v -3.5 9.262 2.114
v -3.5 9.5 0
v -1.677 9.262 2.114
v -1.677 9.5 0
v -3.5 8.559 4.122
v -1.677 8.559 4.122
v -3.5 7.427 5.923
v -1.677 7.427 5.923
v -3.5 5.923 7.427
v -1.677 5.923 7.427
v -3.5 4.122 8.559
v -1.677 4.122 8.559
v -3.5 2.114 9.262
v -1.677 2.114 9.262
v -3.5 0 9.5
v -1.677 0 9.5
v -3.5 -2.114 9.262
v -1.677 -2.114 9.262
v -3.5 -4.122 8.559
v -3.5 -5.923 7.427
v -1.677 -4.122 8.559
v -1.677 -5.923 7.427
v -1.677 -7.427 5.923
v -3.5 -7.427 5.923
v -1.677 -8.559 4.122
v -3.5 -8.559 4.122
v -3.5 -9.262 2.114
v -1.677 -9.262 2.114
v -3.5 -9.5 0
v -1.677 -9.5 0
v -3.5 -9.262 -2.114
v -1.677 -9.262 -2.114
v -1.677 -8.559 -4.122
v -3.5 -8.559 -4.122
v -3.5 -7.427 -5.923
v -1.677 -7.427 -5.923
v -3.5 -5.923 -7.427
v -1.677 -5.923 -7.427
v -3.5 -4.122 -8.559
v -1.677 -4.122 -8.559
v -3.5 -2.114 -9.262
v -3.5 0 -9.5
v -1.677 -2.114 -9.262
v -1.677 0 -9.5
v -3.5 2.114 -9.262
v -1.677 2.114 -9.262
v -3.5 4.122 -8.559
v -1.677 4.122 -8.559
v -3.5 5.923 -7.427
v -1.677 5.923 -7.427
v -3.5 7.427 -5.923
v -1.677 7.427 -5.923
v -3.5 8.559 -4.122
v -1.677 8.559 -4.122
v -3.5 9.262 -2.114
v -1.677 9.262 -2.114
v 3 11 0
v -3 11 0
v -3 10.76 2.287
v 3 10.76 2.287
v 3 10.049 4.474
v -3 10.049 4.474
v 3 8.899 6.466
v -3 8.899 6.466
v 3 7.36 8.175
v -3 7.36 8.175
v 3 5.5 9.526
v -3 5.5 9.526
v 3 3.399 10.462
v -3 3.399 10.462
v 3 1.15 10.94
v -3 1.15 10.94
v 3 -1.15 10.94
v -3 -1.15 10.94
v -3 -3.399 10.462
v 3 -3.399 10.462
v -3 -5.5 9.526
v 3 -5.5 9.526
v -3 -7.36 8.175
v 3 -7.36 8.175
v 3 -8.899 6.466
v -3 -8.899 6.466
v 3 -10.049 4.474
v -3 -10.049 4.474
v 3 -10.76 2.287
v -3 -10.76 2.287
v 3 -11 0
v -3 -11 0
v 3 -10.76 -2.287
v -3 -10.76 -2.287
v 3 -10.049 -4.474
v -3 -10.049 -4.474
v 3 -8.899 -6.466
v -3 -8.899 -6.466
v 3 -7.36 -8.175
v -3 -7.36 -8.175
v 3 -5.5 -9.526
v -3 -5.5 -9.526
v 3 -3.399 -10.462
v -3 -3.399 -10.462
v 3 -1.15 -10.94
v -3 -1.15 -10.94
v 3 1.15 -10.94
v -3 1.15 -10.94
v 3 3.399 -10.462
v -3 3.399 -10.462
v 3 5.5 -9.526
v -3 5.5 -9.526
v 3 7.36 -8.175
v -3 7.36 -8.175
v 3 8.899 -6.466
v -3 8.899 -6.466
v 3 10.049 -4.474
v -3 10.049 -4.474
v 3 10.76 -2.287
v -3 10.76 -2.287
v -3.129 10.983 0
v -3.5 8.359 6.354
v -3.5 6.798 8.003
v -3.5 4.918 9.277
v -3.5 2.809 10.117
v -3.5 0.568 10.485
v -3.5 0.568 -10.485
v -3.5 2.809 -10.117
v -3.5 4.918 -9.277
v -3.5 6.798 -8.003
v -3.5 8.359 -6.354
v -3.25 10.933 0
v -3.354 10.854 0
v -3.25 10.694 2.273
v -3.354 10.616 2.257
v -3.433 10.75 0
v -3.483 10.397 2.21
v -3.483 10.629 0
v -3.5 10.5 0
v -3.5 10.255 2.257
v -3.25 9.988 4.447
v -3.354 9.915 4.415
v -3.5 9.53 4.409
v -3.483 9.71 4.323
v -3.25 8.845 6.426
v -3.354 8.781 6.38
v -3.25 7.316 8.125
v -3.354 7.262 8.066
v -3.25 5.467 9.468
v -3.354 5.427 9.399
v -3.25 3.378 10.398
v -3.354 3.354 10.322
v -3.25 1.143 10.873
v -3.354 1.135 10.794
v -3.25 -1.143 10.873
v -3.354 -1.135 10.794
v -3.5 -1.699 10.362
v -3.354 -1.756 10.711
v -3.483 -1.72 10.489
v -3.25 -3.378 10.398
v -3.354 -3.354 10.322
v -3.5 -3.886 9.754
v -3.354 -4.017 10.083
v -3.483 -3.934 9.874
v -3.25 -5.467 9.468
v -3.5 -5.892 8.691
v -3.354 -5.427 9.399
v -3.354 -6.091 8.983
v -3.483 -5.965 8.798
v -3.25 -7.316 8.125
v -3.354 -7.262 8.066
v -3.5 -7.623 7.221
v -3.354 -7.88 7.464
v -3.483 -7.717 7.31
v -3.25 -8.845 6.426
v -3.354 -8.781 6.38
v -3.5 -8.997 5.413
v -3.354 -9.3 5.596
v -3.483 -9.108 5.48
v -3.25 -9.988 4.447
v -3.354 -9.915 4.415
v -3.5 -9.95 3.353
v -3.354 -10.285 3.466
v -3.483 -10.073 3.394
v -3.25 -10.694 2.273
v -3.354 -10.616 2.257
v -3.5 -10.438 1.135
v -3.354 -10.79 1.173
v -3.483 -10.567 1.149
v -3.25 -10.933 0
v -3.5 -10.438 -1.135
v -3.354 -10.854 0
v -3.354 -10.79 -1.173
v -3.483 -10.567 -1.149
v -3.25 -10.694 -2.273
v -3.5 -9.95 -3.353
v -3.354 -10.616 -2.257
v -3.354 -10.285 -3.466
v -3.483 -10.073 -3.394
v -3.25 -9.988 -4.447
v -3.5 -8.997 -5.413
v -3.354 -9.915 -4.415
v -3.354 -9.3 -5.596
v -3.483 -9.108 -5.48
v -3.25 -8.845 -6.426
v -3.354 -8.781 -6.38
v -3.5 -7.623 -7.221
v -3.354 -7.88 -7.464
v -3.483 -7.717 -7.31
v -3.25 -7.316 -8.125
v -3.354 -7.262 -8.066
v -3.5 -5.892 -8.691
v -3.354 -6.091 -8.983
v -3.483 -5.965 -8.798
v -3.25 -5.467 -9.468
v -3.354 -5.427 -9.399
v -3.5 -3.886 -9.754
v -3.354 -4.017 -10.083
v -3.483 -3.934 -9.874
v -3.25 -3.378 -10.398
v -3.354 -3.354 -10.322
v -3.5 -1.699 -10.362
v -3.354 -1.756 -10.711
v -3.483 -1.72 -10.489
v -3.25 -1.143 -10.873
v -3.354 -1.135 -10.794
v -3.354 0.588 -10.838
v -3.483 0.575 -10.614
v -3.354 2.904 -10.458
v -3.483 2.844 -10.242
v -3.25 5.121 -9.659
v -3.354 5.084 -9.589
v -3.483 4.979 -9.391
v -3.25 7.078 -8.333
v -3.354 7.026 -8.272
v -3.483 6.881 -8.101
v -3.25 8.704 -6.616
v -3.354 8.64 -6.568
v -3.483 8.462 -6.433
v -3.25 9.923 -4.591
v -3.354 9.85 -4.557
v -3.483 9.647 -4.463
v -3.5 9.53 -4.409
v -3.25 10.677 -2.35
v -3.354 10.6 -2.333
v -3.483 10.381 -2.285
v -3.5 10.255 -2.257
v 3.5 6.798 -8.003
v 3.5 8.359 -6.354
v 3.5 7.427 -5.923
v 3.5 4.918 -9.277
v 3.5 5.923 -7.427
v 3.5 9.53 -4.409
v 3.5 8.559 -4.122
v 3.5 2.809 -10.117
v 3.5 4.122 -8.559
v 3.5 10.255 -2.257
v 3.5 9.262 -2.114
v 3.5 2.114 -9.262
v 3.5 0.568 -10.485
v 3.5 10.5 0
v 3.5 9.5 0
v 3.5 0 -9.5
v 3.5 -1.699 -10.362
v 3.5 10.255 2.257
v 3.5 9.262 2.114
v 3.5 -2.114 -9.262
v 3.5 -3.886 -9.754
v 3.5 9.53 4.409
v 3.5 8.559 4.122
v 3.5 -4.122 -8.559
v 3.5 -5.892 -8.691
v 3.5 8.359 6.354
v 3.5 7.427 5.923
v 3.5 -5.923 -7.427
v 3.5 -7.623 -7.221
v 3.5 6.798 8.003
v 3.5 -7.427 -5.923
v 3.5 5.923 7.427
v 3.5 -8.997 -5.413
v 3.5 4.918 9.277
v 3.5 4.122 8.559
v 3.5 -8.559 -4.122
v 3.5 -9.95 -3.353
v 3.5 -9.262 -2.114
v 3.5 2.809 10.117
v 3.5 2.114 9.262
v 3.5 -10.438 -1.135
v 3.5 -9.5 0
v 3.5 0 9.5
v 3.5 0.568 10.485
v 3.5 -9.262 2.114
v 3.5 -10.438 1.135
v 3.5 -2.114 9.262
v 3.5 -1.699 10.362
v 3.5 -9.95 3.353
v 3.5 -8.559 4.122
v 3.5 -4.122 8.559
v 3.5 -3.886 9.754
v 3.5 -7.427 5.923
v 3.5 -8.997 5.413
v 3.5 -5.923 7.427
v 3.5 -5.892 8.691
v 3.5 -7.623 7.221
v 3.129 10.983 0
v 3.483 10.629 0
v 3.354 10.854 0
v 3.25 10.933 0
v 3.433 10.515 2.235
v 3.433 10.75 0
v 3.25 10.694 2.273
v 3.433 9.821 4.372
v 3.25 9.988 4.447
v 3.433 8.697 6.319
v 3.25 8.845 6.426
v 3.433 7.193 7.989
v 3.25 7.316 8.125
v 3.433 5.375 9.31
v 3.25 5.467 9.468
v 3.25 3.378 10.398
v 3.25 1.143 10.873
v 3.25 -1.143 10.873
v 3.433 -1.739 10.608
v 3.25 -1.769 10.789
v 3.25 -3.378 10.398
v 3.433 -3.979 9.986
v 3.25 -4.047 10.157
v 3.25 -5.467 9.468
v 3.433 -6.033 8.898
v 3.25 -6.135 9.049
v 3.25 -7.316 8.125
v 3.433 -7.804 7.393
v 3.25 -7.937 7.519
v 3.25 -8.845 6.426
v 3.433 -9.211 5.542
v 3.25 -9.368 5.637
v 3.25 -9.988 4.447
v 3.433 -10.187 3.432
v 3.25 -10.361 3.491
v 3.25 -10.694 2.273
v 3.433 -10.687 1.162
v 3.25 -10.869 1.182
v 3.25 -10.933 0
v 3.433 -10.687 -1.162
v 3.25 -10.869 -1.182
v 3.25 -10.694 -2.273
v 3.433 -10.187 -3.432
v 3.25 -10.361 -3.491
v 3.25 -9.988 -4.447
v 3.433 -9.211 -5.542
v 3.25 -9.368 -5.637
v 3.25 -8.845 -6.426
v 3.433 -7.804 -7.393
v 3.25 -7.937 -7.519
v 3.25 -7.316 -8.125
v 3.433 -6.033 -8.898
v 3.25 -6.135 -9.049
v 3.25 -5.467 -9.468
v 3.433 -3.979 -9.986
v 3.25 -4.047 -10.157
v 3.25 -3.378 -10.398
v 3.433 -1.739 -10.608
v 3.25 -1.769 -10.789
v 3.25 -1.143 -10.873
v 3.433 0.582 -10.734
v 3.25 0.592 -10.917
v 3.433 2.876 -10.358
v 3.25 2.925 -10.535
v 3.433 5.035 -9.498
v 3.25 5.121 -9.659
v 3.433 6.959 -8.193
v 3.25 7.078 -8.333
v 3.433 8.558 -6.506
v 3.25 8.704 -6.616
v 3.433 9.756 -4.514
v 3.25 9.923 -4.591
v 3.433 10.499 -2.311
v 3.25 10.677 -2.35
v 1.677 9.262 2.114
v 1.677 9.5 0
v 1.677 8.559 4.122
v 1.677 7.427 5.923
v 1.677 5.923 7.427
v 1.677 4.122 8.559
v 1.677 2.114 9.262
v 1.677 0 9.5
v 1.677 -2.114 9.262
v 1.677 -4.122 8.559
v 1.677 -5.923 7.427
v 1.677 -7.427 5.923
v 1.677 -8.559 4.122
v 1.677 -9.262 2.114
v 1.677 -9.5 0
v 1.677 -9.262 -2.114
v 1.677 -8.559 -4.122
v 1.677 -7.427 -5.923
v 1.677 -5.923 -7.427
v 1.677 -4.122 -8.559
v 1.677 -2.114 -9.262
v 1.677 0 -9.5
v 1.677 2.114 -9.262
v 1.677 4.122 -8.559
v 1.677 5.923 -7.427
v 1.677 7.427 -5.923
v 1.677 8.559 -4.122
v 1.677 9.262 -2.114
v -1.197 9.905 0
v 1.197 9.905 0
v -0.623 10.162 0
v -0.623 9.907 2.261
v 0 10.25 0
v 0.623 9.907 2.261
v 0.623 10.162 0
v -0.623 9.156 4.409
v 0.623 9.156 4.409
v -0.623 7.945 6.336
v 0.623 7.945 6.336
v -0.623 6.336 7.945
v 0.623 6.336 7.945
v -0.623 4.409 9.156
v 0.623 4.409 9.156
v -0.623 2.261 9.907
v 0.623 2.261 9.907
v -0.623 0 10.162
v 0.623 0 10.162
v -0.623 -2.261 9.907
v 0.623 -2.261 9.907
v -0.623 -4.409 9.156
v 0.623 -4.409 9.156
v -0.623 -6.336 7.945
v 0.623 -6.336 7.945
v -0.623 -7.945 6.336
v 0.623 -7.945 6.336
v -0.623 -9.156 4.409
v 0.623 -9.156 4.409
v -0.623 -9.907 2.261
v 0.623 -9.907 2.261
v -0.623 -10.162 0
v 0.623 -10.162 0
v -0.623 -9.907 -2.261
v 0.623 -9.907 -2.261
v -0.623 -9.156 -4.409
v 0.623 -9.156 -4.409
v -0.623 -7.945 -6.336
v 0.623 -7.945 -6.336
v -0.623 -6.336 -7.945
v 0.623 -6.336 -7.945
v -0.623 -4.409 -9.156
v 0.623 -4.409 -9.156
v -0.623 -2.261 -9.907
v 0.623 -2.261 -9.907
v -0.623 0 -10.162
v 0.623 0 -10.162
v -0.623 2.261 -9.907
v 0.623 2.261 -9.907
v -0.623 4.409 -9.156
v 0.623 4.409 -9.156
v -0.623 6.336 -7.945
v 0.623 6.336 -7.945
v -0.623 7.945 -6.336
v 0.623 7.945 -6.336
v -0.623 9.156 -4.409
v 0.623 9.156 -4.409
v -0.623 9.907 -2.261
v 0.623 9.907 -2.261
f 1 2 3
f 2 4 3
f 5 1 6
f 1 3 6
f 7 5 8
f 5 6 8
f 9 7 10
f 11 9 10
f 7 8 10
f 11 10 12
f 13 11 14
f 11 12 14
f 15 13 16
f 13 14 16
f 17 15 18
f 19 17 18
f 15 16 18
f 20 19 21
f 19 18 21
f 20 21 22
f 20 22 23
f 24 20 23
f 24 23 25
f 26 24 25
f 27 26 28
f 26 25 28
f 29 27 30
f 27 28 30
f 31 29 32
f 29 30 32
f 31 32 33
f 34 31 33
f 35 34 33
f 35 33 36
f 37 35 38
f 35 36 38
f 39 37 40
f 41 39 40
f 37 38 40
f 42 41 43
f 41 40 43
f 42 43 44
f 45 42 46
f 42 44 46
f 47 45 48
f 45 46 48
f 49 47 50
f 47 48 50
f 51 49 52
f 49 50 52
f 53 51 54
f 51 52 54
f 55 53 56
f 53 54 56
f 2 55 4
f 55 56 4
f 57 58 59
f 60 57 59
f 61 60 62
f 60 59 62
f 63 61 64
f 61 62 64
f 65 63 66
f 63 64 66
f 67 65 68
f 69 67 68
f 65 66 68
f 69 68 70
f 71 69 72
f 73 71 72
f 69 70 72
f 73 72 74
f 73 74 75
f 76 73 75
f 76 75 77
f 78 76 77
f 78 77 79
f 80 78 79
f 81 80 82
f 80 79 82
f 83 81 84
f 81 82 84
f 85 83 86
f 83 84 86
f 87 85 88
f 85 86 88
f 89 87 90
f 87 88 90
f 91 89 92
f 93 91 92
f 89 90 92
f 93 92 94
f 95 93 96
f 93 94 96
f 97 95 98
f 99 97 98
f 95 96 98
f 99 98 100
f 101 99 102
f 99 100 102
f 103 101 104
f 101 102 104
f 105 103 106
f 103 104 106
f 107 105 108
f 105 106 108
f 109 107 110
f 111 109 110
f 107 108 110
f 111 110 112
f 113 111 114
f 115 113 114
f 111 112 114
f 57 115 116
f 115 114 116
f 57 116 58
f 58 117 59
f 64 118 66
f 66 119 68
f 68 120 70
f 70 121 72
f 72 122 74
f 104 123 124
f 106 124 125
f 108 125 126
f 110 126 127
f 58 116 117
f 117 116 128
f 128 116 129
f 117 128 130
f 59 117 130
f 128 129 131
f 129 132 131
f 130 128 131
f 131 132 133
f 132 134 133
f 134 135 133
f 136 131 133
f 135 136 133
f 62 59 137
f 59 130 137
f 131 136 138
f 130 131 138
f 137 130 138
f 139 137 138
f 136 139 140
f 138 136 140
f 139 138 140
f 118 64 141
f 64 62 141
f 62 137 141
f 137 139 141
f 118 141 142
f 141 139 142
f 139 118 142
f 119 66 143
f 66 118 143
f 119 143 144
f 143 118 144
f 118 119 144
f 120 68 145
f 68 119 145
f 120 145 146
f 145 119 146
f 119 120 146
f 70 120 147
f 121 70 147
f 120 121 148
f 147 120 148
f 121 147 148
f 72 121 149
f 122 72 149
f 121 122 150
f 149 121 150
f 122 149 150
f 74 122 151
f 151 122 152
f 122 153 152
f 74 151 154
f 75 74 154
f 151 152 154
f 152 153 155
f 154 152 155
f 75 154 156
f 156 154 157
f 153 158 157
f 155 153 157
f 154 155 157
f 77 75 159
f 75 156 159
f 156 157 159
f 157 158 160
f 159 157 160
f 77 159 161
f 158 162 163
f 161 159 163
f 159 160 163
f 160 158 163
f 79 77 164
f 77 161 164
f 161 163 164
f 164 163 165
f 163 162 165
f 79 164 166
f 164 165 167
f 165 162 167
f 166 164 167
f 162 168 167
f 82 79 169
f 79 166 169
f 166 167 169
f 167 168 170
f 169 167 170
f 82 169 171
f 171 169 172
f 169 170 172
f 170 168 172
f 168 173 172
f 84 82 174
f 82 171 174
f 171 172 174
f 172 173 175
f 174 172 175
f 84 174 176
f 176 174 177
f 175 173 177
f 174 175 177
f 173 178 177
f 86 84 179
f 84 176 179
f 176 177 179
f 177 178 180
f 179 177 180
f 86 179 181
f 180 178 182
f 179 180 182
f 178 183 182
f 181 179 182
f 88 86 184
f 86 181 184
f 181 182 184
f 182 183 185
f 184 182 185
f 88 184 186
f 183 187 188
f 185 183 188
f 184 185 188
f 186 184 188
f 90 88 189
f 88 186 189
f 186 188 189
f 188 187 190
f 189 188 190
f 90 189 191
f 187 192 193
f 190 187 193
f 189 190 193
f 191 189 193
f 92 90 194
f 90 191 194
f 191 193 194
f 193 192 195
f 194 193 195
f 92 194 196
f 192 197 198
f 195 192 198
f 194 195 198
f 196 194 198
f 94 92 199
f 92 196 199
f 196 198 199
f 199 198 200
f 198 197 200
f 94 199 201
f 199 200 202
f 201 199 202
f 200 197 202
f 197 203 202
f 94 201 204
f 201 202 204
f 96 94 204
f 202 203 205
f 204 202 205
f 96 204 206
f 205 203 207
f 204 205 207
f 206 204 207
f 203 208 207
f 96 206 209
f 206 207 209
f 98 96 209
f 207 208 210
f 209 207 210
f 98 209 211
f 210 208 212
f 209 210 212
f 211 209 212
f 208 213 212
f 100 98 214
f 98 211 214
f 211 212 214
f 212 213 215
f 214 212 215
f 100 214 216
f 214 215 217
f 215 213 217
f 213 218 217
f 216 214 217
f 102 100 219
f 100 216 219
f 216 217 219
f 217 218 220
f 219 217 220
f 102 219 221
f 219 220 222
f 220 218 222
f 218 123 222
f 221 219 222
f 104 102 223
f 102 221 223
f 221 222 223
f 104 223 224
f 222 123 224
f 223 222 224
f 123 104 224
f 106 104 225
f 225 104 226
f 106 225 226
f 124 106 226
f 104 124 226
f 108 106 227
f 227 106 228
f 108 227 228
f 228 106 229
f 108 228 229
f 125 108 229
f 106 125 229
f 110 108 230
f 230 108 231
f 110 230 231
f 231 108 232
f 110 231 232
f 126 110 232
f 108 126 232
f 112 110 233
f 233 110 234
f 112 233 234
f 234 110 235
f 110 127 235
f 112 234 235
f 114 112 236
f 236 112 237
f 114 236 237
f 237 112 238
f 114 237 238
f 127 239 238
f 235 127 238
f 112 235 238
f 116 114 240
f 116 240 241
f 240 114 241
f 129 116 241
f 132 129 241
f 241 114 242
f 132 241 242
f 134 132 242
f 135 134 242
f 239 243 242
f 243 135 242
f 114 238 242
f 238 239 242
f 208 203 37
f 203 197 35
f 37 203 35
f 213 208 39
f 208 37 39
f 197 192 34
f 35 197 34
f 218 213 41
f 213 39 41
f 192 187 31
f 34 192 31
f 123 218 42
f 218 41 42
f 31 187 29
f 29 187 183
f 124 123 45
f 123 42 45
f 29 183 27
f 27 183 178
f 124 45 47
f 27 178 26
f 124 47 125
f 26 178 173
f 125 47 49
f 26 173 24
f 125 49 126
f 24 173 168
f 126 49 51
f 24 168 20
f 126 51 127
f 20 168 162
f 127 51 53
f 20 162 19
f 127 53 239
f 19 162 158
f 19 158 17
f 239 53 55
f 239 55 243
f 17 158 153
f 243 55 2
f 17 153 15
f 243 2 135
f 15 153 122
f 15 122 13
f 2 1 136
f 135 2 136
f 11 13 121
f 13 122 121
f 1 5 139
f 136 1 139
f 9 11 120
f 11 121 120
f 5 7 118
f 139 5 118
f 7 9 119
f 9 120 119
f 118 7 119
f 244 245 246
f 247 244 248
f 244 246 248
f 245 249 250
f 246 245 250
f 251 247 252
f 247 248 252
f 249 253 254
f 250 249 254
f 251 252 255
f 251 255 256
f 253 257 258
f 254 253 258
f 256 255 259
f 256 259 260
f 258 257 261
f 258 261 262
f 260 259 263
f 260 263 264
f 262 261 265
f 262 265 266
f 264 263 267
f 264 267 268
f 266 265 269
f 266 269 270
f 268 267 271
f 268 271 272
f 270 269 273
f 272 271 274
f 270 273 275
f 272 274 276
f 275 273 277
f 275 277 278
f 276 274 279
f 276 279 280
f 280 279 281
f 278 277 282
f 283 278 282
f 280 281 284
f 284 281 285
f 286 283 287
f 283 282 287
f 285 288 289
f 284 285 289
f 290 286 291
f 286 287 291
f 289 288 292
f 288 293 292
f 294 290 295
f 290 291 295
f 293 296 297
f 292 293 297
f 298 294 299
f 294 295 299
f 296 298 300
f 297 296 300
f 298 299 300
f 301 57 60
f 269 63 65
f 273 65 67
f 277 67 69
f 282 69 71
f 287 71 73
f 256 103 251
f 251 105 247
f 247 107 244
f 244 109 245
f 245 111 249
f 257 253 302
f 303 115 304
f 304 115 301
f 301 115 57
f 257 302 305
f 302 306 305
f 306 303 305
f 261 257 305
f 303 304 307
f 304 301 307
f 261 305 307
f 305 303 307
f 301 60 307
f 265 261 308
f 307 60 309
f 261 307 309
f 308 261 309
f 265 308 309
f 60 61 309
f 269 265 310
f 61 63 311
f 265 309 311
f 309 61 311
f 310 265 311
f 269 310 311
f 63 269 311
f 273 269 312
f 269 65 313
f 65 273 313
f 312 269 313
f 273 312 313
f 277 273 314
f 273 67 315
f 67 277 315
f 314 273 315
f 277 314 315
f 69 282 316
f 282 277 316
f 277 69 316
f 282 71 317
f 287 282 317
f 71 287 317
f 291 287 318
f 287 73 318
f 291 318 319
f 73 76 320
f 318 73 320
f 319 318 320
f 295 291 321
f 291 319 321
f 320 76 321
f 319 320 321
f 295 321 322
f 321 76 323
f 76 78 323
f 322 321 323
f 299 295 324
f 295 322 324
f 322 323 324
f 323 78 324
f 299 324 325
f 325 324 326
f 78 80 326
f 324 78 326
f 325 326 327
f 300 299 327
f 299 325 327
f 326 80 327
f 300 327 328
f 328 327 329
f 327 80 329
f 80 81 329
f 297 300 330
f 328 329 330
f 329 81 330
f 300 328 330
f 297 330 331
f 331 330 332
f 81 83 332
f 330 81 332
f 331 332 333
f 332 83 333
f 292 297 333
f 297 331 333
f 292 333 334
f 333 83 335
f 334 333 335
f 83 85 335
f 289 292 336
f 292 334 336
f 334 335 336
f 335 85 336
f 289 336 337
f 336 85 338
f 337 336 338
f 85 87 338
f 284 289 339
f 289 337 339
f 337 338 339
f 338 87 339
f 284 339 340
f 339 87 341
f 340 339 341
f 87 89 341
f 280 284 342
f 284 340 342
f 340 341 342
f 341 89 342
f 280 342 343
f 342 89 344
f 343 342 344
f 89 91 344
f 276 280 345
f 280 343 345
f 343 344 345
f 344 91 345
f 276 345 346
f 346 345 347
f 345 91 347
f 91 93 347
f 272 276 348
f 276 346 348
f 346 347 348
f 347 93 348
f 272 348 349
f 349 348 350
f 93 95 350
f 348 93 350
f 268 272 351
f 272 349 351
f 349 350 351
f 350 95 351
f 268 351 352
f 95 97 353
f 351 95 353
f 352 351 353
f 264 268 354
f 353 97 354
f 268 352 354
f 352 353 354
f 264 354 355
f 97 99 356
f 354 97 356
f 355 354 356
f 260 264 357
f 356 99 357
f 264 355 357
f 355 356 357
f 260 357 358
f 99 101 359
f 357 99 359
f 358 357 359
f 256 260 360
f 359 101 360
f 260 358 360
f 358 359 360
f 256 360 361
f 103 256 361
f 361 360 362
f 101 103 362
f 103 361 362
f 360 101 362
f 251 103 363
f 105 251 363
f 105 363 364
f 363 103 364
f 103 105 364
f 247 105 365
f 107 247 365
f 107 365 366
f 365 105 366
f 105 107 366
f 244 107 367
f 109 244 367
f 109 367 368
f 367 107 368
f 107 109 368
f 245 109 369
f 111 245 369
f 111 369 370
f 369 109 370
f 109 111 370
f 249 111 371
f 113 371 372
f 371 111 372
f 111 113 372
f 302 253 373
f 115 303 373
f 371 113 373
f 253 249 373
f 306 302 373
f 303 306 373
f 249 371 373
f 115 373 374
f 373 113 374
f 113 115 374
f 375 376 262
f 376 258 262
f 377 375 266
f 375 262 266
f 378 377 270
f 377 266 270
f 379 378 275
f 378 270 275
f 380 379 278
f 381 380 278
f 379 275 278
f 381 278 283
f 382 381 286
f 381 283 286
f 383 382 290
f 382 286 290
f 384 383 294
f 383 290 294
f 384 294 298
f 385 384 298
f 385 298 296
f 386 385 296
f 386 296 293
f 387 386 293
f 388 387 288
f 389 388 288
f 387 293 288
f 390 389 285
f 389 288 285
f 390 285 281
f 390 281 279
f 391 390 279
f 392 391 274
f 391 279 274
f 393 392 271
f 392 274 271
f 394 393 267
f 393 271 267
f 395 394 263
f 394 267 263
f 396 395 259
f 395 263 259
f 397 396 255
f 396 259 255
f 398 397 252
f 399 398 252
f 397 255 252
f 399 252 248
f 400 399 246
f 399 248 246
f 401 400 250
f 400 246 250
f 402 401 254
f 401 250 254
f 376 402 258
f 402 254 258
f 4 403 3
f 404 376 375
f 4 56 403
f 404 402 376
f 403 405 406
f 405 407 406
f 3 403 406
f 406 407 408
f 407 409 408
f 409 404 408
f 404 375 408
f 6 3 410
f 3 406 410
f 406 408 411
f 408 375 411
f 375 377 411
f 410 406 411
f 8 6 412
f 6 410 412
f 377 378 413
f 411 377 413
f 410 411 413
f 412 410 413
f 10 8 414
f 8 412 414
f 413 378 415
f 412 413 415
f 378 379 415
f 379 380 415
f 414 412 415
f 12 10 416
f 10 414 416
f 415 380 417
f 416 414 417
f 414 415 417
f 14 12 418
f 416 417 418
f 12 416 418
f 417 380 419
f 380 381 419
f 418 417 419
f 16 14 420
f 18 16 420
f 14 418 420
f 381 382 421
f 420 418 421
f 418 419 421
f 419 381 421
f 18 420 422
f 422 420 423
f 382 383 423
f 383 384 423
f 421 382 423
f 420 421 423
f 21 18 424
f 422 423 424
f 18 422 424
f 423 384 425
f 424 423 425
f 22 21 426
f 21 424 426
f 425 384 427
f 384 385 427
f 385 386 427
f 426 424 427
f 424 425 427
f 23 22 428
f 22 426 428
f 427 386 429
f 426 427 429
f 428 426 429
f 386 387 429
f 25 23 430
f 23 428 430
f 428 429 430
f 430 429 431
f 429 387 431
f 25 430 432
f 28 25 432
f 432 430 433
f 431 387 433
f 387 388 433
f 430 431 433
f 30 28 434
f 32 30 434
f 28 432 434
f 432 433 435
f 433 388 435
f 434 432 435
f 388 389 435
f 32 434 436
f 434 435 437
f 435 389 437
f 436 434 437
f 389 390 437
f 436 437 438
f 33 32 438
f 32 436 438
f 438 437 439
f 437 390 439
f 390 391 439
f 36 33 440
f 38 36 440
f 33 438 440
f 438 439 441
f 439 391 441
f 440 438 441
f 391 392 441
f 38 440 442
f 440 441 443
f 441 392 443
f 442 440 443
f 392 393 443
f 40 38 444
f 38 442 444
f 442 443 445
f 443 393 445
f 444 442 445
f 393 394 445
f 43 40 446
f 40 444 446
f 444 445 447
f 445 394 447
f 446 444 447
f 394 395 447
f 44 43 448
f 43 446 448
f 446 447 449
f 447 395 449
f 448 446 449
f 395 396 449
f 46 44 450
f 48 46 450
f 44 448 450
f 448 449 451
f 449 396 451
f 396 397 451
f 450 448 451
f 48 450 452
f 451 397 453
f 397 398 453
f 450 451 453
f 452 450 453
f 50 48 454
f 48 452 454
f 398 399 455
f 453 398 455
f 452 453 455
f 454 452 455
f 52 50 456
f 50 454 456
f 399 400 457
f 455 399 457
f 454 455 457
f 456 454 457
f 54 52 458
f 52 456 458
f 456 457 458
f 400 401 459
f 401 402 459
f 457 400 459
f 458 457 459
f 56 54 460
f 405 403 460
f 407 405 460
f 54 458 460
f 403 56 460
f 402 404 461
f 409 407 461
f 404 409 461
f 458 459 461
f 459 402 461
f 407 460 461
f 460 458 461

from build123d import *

# Parameters (mm, degrees)
FILLET1_R = 0.5


with BuildPart() as part:
    # Sketch1 → Revolve1 (revolve)
    with BuildSketch(Plane.XY):
        with BuildLine():
            Line((-3.5, 9.5), (-1.677050983, 9.5))
            ThreePointArc((-1.677050983, 9.5), (0, 10.25), (1.677050983, 9.5))
            Line((1.677050983, 9.5), (3.5, 9.5))
            Line((3.5, 9.5), (3.5, 11))
            Line((3.5, 11), (-3.5, 11))
            Line((-3.5, 11), (-3.5, 9.5))
        make_face()
    revolve(axis=Axis((-29.842592593, 0, 0), (1, 0, 0)))

    # Fillet1
    fillet1_edges = [part.edges().sort_by_distance(p)[0] for p in [
        (3.5, -11, 0),
        (-3.5, -11, 0),
    ]]
    fillet(fillet1_edges, radius=FILLET1_R)


solid = part.part
